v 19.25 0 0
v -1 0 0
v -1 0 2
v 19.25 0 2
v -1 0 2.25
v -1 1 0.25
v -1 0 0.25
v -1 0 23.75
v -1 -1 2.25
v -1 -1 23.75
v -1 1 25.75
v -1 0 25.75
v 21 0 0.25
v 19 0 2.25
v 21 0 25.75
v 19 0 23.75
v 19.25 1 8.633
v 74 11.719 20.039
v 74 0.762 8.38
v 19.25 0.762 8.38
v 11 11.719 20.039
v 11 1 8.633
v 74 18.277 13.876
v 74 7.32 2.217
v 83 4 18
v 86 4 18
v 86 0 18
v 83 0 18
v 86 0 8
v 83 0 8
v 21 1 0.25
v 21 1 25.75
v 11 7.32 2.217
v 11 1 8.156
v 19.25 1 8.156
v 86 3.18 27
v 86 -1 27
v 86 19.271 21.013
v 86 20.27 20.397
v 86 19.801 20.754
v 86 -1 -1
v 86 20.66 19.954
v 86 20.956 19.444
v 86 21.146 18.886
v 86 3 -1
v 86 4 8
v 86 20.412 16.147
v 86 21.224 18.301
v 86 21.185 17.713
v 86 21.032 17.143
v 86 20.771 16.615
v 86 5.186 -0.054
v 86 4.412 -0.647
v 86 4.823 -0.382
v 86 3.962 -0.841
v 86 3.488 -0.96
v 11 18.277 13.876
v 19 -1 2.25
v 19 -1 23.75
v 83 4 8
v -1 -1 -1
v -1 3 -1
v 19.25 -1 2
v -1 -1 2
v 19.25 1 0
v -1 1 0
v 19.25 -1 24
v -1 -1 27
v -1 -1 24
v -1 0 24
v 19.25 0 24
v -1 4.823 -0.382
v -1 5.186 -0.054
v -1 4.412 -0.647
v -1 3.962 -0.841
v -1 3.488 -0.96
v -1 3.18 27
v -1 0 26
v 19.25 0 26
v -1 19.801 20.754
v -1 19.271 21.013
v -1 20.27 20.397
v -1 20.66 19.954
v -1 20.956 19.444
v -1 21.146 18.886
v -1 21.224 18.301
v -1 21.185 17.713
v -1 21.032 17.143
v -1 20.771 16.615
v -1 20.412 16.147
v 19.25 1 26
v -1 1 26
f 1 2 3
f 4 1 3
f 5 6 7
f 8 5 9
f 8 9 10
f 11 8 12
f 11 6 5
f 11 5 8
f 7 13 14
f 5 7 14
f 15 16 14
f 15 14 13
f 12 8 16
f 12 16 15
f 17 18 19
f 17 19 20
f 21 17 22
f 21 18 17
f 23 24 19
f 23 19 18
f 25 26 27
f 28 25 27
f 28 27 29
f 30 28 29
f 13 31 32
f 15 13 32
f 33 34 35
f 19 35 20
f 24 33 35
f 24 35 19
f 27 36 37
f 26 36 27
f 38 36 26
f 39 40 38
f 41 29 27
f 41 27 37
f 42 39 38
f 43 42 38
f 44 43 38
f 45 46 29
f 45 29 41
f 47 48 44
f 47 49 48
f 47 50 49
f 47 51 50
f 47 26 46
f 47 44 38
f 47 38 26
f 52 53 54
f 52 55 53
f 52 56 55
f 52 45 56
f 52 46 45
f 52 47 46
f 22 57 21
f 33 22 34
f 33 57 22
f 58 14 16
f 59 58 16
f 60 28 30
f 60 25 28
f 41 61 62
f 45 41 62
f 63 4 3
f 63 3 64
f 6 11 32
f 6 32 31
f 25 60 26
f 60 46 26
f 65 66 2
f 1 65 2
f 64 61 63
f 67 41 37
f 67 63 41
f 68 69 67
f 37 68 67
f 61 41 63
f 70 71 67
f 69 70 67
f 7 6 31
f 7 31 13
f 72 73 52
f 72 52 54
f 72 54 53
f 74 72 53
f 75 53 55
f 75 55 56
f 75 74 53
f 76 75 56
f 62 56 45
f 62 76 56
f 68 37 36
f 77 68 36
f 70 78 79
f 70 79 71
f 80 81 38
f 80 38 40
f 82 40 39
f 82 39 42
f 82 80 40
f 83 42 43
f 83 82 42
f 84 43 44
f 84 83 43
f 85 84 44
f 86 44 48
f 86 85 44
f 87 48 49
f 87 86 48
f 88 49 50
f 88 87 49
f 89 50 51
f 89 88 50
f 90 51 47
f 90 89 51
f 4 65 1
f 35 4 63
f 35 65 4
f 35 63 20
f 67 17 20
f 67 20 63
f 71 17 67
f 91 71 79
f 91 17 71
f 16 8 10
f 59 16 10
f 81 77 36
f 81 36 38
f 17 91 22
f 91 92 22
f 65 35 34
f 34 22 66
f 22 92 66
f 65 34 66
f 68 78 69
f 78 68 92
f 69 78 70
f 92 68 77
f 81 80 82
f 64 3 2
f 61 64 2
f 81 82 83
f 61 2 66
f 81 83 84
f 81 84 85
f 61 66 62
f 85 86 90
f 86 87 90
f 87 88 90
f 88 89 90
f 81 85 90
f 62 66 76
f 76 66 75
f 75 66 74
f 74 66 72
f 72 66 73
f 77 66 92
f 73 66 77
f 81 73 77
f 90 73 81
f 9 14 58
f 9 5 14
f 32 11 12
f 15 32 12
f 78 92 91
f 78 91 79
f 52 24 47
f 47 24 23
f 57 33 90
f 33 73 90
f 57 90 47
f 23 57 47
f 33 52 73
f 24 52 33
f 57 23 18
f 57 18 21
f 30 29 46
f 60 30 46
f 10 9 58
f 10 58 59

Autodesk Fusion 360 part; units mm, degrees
sketch "profile" plane through (0, 0, 0) normal (1, 0, 0) x (0, 0, -1)
  line L0 (0, 0) -> (-26, 0)
  line L1 (-26, 0) -> (-26, 3)
  line L2 (-26, 3) -> (-20.0762, 18.9227)
  line L3 (0, 0) -> (0, 3)
  line L4 (-0.6304, 4.4574) -> (-16.8321, 19.6828)
  arc A0 (-16.8321, 19.6828) -> (-20.0762, 18.9227) centre (-18.2017, 18.2254) ccw
  arc A1 (0, 3) -> (-0.6304, 4.4574) centre (-2, 3) ccw
  point P0 (-19.0263, 21.7448)
  dimension "d1" = 26
  dimension "d2" = 3
  dimension "d3" = 20
  dimension "d4" = 2
  dimension "d5" = 2
extrude "Extrude1" add sketch "profile" along normal blind 85 makes body 1
shell "Shell1" thickness 1 outward yes removed faces 0 bodies 1
sketch "FACE" plane through (0, 2.7812, -2.6136) normal (0, 0.7287, -0.6848) x (-1, 0, 0)
  line L0 (1, 3.5119) -> (1, 25.7449)
  line L1 (1, 25.7449) -> (-86, 25.7449)
  line L2 (-86, 25.7449) -> (-86, 3.5119)
  line L3 (-86, 3.5119) -> (1, 3.5119)
  line L4 (-74, 22.6284) -> (-11, 22.6284)
  line L5 (-11, 22.6284) -> (-11, 6.6284)
  line L6 (-11, 6.6284) -> (-74, 6.6284)
  line L7 (-74, 6.6284) -> (-74, 22.6284)
  line L8 (-86, 14.6284) -> (-74, 14.6284)
  line L9 (-11, 14.6284) -> (1, 14.6284)
  line L10 (-42.5, 22.6284) -> (-42.5, 25.7449)
  line L11 (-42.5, 6.6284) -> (-42.5, 3.5119)
  dimension "d10" = 63
  dimension "d11" = 16
extrude "Extrude2" cut sketch "FACE" against normal blind 9 contours L4 L5 L6 L7 bodies 1
sketch "Port" plane through (86, 0, 0) normal (1, 0, 0) x (0, 0, -1)
  line L0 (1, -1) -> (1, 3)
  arc A0 (1, 3) -> (0.0544, 5.1862) centre (-2, 3) ccw
  line L1 (0.0544, 5.1862) -> (-16.1473, 20.4115)
  arc A1 (-16.1473, 20.4115) -> (-21.0134, 19.2714) centre (-18.2017, 18.2254) ccw
  line L2 (-21.0134, 19.2714) -> (-27, 3.18)
  line L3 (-27, 3.18) -> (-27, -1)
  line L4 (-27, -1) -> (1, -1)
  line L5 (-13, -1) -> (-13, 0)
  line L6 (-13, 0) -> (-8, 0)
  line L7 (-8, 0) -> (-8, 4)
  line L8 (-8, 4) -> (-18, 4)
  line L9 (-18, 4) -> (-18, 0)
  line L10 (-18, 0) -> (-13, 0)
extrude "Extrude3" cut sketch "Port" against normal blind 3 contours L6 L7 L8 L9 L10 bodies 1
sketch "Cutout" plane through (-1, 0, 0) normal (-1, 0, 0) x (0, 0, 1)
  line L0 (-1, 3) -> (-1, -1)
  line L1 (-1, -1) -> (27, -1)
  line L2 (27, -1) -> (27, 3.18)
  line L3 (27, 3.18) -> (21.0134, 19.2714)
  arc A0 (21.0134, 19.2714) -> (16.1473, 20.4115) centre (18.2017, 18.2254) ccw
  line L4 (16.1473, 20.4115) -> (-0.0544, 5.1862)
  arc A1 (-0.0544, 5.1862) -> (-1, 3) centre (2, 3) ccw
  line L5 (13, -1) -> (13, 0)
  line L6 (-1, -1) -> (-1, 0)
  line L7 (27, -1) -> (27, 0)
  line L8 (27, 0) -> (24, 0)
  line L9 (-1, 0) -> (2, 0)
  line L10 (2, 0) -> (2.25, 0)
  line L11 (24, 0) -> (23.75, 0)
  line L12 (23.75, 0) -> (2.25, 0)
  line L13 (2, 0) -> (2, -1)
  line L14 (24, 0) -> (24, -1)
  line L15 (2.25, 0) -> (2.25, -1)
  line L16 (23.75, 0) -> (23.75, -1)
  line L17 (2.25, 0) -> (2.25, 1)
  line L18 (2.25, 1) -> (0.25, 1)
  line L19 (0.25, 1) -> (0.25, 0)
  line L20 (24, 1) -> (25.75, 1)
  line L21 (25.75, 1) -> (25.75, 0)
  line L22 (2.25, 1) -> (24, 1)
  line L23 (23.75, 0) -> (23.75, -1)
  line L24 (2.25, 0) -> (2.25, -1)
  line L25 (0.25, 1) -> (0, 1)
  line L26 (0, 1) -> (0, 0)
  line L27 (25.75, 1) -> (26, 1)
  line L28 (26, 1) -> (26, 0)
  line L29 (26, 0.5) -> (27, 0.5)
  line L30 (0, 0.5) -> (-1, 0.5)
  dimension "d16" = 0.25
  dimension "d17" = 0.25
  dimension "d18" = 3
  dimension "d19" = 3
  dimension "d20" = 1
  dimension "d21" = 2
  dimension "d22" = 3
  dimension "d23" = 3
  dimension "d24" = 0
extrude "Extrude4" cut sketch "Cutout" against normal blind 20.25 contours L9 L19 L25 L26 | L1 L10 L13 L15 L24 | L9 L10 L17 L18 L19 | L1 L5 L12 L15 L24 | L8 L11 L12 L17 L20 L21 L22 | L1 L5 L12 L16 L23 | L8 L21 L27 L28 | L1 L11 L14 L16 L23 bodies 1
extrude "Extrude5" add sketch "Cutout" against normal blind 20 separate body contours L9 L10 L17 L18 L19 | L1 L5 L12 L15 L24 | L8 L11 L12 L17 L20 L21 L22 | L1 L5 L12 L16 L23 makes body 2
extrude "Extrude6" add sketch "Cutout" against normal blind 21 contours L9 L10 L17 L18 L19 | L8 L11 L12 L17 L20 L21 L22 bodies 2
extrude "Extrude7" add 1 faces at (20, 0.6667, 8.75) along direction (1, 0, 0) blind 1 on bodies 2 bodies 2
